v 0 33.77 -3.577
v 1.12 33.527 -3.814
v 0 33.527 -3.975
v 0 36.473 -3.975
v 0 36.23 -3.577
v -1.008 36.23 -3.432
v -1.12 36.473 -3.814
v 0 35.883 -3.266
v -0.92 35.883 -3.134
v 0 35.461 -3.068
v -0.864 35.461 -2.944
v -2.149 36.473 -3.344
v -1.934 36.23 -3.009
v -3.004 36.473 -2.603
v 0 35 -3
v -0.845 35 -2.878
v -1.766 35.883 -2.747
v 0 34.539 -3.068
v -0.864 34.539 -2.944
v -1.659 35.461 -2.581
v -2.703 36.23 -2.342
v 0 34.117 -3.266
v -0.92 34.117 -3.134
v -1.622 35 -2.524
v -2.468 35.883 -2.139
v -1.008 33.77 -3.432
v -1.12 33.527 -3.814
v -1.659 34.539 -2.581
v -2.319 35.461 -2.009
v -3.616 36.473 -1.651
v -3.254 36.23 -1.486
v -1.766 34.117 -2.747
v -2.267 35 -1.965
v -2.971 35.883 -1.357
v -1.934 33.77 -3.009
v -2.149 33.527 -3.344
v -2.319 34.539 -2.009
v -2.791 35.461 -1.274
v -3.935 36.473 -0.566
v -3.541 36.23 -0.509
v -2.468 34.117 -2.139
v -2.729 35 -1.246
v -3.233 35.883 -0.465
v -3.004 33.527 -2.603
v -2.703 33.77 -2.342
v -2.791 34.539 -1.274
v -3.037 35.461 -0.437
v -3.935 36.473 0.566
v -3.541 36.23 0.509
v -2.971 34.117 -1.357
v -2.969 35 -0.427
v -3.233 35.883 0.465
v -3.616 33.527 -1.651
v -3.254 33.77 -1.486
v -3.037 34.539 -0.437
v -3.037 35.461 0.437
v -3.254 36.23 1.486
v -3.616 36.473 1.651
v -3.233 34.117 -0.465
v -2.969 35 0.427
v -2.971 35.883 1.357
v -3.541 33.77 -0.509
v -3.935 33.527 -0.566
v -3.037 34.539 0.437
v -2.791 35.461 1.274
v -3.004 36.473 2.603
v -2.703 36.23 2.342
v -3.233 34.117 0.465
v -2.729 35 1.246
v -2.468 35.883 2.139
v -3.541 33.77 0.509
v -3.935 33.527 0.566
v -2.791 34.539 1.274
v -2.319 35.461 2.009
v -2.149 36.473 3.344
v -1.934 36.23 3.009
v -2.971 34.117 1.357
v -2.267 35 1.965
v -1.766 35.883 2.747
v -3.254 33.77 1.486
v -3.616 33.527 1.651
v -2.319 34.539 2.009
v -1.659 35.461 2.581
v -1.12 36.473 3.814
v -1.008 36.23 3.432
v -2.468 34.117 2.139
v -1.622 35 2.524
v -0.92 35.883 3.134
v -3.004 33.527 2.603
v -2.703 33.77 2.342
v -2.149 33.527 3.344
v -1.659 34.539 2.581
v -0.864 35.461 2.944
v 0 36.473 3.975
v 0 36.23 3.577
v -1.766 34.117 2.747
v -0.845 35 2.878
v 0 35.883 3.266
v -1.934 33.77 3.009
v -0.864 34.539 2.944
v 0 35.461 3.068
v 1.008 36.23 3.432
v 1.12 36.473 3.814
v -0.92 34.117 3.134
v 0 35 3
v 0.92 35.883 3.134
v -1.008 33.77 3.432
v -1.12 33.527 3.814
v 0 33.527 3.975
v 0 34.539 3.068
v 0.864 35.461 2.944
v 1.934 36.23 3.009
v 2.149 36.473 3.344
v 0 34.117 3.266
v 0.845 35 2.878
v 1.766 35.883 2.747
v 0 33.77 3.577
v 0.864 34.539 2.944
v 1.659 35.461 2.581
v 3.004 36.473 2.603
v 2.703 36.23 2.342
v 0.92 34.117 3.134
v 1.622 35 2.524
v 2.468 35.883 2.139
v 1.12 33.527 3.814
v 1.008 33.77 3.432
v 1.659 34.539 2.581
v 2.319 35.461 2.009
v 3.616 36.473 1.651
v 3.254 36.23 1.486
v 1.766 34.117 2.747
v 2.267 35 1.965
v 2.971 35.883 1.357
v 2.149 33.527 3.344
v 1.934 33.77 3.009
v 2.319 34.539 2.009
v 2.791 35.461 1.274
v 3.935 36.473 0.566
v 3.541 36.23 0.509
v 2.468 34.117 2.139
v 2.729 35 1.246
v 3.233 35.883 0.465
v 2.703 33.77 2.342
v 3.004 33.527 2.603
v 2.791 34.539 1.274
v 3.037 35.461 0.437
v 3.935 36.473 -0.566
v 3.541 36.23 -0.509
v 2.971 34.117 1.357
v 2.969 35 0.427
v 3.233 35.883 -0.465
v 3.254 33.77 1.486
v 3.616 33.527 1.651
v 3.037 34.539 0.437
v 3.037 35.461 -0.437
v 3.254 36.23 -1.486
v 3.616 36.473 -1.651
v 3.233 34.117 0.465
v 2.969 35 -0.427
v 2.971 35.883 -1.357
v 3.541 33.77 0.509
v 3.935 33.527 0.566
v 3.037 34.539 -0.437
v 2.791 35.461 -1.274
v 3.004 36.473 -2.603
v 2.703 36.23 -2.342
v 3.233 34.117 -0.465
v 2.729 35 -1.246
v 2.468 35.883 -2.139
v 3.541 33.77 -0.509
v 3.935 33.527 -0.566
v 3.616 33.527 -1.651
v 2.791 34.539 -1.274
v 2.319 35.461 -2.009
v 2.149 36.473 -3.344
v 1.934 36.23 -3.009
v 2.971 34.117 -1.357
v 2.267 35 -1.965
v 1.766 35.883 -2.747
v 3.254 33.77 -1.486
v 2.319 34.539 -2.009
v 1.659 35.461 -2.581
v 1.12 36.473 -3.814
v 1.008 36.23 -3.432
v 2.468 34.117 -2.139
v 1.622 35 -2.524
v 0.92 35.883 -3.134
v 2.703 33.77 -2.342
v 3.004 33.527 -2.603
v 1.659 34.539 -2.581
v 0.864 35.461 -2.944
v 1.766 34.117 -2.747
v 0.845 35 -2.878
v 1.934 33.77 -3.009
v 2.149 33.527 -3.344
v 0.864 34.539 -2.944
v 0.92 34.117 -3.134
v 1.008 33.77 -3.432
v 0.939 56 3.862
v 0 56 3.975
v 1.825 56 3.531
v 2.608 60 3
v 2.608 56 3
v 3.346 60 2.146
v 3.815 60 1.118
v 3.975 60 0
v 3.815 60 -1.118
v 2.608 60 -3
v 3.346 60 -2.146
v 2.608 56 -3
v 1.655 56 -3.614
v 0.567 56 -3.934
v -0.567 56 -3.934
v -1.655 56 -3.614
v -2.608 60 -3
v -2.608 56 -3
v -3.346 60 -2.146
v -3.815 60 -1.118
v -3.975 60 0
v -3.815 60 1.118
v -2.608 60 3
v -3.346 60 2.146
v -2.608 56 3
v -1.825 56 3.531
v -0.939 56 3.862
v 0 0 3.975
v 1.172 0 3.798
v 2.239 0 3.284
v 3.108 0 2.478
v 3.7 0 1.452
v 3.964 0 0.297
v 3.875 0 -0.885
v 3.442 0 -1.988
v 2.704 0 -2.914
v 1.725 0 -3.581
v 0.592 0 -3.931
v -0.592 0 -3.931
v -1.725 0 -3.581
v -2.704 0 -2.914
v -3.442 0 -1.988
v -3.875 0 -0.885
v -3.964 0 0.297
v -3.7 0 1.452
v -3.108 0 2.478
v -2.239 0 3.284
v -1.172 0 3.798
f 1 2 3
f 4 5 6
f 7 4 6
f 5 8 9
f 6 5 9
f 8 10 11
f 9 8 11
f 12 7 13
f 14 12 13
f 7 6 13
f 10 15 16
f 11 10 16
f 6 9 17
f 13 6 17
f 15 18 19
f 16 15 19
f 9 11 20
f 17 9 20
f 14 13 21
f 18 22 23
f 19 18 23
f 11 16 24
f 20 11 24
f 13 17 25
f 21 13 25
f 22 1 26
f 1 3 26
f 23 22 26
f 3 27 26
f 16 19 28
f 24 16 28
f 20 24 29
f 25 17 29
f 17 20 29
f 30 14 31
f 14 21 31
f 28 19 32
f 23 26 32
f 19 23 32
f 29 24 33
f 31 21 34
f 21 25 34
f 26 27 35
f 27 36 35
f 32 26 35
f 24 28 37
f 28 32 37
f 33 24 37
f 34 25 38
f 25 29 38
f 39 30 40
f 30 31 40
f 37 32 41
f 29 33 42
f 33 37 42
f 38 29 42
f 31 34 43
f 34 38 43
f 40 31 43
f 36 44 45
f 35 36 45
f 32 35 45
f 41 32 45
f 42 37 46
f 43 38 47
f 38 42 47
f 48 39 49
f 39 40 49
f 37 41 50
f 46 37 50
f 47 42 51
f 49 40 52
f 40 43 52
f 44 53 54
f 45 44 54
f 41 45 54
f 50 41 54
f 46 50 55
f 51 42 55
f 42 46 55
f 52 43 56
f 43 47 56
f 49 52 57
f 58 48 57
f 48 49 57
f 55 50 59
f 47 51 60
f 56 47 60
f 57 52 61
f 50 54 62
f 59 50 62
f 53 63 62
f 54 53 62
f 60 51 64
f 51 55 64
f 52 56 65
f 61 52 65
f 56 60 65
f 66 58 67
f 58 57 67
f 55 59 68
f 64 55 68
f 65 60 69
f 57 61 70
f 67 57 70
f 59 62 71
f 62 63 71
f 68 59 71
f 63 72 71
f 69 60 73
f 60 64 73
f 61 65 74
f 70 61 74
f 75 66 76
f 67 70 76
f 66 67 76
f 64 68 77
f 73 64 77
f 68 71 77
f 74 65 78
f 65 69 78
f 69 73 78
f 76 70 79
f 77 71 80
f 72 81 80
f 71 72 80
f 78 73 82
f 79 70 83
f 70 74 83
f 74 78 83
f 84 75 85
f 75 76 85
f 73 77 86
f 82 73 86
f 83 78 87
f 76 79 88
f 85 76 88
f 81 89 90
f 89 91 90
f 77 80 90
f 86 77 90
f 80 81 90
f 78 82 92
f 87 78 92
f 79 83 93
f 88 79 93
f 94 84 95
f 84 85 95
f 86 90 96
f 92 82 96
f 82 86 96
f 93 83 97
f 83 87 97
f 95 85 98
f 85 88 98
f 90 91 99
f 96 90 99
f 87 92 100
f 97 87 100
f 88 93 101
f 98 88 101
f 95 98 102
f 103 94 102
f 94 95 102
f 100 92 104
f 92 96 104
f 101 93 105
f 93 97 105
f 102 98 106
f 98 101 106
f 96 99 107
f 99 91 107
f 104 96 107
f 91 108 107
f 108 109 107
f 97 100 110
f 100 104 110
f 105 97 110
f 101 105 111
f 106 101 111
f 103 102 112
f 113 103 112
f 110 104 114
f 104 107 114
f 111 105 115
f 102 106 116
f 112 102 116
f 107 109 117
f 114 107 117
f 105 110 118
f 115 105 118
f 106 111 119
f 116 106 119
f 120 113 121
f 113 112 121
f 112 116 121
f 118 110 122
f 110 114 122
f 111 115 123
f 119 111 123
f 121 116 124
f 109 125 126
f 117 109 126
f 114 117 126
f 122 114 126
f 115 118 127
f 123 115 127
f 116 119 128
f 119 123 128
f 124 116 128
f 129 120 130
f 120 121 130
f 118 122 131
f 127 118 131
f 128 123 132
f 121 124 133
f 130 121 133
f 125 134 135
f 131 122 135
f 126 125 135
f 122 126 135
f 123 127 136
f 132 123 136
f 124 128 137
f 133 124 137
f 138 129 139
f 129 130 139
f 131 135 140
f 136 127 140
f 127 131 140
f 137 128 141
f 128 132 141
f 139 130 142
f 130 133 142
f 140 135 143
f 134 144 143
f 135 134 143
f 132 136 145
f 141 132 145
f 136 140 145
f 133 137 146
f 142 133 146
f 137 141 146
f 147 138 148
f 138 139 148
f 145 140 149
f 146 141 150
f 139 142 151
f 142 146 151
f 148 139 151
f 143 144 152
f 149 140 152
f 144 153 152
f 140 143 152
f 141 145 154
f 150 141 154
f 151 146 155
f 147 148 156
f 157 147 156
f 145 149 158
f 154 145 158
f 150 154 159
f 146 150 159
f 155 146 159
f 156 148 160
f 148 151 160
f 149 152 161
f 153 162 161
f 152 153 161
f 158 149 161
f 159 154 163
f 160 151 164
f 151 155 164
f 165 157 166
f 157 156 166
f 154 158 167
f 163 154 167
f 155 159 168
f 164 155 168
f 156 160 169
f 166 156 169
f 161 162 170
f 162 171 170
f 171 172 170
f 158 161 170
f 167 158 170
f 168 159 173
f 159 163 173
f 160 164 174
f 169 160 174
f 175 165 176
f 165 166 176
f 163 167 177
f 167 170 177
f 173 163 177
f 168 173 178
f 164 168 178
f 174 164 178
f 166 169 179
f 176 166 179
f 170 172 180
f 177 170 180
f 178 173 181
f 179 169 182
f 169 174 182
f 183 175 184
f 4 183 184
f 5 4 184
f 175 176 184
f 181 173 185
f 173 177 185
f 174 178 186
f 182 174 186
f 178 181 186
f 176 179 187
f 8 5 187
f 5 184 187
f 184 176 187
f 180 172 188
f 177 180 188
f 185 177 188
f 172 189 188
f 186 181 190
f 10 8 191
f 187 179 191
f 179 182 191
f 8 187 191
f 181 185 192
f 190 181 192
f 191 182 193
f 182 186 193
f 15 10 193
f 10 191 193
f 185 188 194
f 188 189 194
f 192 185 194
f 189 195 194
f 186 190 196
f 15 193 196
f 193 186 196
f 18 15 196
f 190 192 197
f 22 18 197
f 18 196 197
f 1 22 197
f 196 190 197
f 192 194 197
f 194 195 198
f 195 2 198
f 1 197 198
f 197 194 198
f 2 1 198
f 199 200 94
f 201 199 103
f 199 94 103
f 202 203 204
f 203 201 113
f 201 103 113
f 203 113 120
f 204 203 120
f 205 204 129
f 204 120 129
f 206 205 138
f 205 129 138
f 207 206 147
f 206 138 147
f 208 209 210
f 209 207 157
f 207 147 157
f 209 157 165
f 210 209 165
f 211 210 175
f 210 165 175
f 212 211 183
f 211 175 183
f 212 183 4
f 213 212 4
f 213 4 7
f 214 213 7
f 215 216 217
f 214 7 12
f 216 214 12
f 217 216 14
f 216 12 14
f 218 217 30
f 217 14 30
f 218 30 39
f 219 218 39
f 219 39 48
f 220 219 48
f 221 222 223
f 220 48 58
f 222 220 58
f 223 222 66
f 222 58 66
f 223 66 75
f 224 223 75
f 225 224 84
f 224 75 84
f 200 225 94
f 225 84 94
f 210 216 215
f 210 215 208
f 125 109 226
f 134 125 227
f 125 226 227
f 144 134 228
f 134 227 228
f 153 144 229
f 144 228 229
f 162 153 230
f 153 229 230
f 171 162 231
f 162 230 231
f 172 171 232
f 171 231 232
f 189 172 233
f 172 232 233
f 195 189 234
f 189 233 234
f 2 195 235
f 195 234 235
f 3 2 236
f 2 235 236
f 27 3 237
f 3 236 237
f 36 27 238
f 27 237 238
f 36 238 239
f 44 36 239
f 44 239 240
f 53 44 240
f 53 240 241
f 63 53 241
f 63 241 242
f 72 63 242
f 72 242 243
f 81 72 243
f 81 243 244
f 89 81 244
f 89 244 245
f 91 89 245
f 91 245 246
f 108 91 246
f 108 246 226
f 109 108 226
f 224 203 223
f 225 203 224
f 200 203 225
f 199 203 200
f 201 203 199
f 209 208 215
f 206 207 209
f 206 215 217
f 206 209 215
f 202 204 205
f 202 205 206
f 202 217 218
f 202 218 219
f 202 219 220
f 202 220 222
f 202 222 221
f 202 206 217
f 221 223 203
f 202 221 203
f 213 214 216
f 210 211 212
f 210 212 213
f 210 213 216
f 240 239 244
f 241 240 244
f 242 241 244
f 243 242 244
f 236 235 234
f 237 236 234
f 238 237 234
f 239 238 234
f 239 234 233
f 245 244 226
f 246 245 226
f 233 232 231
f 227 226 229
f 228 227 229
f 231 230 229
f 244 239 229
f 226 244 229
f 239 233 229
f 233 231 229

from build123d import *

# Parameters (mm, degrees)
CROQUIS1_R              = 3.975
SALIENTE_EXTRUIR1_DEPTH = 60
CORTAR_EXTRUIR1_START   = -4
CORTAR_EXTRUIR1_DEPTH   = 4


with BuildPart() as part:
    # Croquis1 → Saliente-Extruir1 (new body)
    with BuildSketch(Plane(origin=(0, 0, 0), x_dir=(1, 0, 0), z_dir=(0, 1, 0))):
        with Locations(Location((0, 0, 0), (0, 0, 270))):
            Circle(CROQUIS1_R)
    extrude(amount=SALIENTE_EXTRUIR1_DEPTH)

    # Croquis2 → Cortar-Revolución1 (revolve, cut)
    with BuildSketch(Plane.XY, mode=Mode.PRIVATE) as cortar_revoluci_n1_sk:
        with BuildLine():
            Line((3.975, 33.527120168), (3.975, 36.472879832))
            ThreePointArc((3.975, 36.472879832), (3, 35), (3.975, 33.527120168))
        make_face()
    revolve(cortar_revoluci_n1_sk.sketch.rotate(Axis((0, 0, 0), (0, 1, 0)), 90), axis=Axis((0, 0, 0), (0, 1, 0)), mode=Mode.SUBTRACT)

    # Croquis3 → Cortar-Extruir1 (cut)
    with BuildSketch(Plane(origin=(0, 60, 0), x_dir=(1, 0, 0), z_dir=(0, 1, 0)).offset(CORTAR_EXTRUIR1_START)):
        with BuildLine():
            Line((-2.607800798, 3), (2.607800798, 3))
            ThreePointArc((2.607800798, 3), (0, 3.975), (-2.607800798, 3))
        make_face()
        with BuildLine():
            Line((-2.607800798, -3), (2.607800798, -3))
            ThreePointArc((2.607800798, -3), (0, -3.975), (-2.607800798, -3))
        make_face()
    extrude(amount=CORTAR_EXTRUIR1_DEPTH, mode=Mode.SUBTRACT)


solid = part.part
